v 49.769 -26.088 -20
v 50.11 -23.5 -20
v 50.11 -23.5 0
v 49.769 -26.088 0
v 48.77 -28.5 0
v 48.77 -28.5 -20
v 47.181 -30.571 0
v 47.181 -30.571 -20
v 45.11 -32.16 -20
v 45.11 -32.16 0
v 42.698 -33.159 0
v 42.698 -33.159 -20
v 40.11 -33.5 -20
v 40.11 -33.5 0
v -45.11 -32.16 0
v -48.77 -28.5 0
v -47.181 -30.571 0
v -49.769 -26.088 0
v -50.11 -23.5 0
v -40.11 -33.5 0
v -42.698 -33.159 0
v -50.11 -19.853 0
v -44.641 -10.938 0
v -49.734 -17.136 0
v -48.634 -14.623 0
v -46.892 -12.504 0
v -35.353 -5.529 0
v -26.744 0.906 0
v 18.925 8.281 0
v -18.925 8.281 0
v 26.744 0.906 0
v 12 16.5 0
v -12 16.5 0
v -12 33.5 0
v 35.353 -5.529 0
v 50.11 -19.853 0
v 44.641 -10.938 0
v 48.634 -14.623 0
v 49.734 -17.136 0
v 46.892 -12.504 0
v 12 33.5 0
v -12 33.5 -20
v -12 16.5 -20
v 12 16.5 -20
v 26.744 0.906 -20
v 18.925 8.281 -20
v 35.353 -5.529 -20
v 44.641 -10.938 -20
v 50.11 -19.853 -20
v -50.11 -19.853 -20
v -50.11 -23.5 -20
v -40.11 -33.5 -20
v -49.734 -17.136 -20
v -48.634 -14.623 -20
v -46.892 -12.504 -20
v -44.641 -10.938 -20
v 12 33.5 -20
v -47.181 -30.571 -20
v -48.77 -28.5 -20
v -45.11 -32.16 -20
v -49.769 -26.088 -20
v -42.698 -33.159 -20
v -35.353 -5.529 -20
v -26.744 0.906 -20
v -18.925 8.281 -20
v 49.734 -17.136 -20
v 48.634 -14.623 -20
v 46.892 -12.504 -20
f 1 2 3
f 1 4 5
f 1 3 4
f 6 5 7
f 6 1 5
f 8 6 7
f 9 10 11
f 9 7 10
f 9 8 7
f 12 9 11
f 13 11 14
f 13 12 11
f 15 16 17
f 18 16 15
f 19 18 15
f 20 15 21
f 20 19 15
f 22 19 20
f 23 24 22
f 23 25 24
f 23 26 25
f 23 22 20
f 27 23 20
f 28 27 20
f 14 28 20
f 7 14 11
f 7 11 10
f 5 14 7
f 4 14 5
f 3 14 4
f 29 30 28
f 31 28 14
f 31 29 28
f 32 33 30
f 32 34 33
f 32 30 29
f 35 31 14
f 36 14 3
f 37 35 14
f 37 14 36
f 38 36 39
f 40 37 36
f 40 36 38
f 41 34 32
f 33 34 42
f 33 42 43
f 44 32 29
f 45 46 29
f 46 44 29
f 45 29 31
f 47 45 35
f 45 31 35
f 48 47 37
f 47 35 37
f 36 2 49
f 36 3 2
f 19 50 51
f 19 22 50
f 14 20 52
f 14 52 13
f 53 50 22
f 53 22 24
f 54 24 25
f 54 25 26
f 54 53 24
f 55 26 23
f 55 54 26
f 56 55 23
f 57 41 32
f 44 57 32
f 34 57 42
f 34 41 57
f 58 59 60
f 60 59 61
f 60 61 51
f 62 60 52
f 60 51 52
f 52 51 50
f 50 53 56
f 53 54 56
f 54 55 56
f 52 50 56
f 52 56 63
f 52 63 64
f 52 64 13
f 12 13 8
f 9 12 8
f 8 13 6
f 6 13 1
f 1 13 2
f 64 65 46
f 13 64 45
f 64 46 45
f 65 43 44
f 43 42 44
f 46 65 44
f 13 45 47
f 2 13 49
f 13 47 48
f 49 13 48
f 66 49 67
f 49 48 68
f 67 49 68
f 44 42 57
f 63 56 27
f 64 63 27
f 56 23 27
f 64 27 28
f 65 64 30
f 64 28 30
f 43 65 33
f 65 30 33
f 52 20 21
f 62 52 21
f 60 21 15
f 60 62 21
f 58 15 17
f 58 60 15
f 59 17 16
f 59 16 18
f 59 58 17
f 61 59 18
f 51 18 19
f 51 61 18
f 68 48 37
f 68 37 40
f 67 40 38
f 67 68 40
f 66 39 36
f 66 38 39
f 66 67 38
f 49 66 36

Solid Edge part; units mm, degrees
sketch "Sketch1" plane through (0, 0, 0) normal (0, 0, 1) x (1, 0, 0)
  line L0 (-50.11, -33.5) -> (50.11, -33.5)
  line L1 (50.11, -33.5) -> (50.11, 33.5)
  line L2 (50.11, 33.5) -> (-50.11, 33.5)
  line L3 (-50.11, 33.5) -> (-50.11, -33.5)
extrude "Protrusion1" add sketch "Sketch1" against normal blind 20
sketch "Sketch2" plane through (0, 0, 0) normal (0, 0, 1) x (1, 0, 0)
  line L0 (-50.11, 33.5) -> (-12, 33.5)
  line L1 (-12, 33.5) -> (-12, 16.5)
  line L2 (-12, 16.5) -> (-50.11, 16.5)
  line L3 (-50.11, 16.5) -> (-50.11, 33.5)
extrude "ExtrudedCutout_1" cut sketch "Sketch2" against normal blind 20
sketch "Sketch3" plane through (0, 0, 0) normal (0, 0, 1) x (1, 0, 0)
  line L0 (50.11, 33.5) -> (12, 33.5)
  line L1 (12, 33.5) -> (12, 16.5)
  line L2 (12, 16.5) -> (50.11, 16.5)
  line L3 (50.11, 16.5) -> (50.11, 33.5)
extrude "ExtrudedCutout_2" cut sketch "Sketch3" against normal blind 20
sketch "Sketch4" plane through (0, 0, 0) normal (0, 0, 1) x (1, 0, 0)
  arc A0 (-50.11, -13.5) -> (-12, 16.5) centre (-87.2296, 72.8605) ccw
  line L0 (-12, 16.5) -> (-50.11, 16.5)
  line L1 (-50.11, 16.5) -> (-50.11, -13.5)
extrude "ExtrudedCutout_3" cut sketch "Sketch4" against normal blind 20
sketch "Sketch5" plane through (0, 0, 0) normal (0, 0, 1) x (1, 0, 0)
  arc A0 (50.11, -13.5) -> (12, 16.5) centre (87.2296, 72.8605) cw
  line L0 (12, 16.5) -> (50.11, 16.5)
  line L1 (50.11, 16.5) -> (50.11, -13.5)
extrude "ExtrudedCutout_4" cut sketch "Sketch5" against normal blind 20
fillet "Round_1" radius 10 4 edges at (50.11, -13.5, -10) (50.11, -33.5, -10) (-50.11, -33.5, -10) (-50.11, -13.5, -10)
